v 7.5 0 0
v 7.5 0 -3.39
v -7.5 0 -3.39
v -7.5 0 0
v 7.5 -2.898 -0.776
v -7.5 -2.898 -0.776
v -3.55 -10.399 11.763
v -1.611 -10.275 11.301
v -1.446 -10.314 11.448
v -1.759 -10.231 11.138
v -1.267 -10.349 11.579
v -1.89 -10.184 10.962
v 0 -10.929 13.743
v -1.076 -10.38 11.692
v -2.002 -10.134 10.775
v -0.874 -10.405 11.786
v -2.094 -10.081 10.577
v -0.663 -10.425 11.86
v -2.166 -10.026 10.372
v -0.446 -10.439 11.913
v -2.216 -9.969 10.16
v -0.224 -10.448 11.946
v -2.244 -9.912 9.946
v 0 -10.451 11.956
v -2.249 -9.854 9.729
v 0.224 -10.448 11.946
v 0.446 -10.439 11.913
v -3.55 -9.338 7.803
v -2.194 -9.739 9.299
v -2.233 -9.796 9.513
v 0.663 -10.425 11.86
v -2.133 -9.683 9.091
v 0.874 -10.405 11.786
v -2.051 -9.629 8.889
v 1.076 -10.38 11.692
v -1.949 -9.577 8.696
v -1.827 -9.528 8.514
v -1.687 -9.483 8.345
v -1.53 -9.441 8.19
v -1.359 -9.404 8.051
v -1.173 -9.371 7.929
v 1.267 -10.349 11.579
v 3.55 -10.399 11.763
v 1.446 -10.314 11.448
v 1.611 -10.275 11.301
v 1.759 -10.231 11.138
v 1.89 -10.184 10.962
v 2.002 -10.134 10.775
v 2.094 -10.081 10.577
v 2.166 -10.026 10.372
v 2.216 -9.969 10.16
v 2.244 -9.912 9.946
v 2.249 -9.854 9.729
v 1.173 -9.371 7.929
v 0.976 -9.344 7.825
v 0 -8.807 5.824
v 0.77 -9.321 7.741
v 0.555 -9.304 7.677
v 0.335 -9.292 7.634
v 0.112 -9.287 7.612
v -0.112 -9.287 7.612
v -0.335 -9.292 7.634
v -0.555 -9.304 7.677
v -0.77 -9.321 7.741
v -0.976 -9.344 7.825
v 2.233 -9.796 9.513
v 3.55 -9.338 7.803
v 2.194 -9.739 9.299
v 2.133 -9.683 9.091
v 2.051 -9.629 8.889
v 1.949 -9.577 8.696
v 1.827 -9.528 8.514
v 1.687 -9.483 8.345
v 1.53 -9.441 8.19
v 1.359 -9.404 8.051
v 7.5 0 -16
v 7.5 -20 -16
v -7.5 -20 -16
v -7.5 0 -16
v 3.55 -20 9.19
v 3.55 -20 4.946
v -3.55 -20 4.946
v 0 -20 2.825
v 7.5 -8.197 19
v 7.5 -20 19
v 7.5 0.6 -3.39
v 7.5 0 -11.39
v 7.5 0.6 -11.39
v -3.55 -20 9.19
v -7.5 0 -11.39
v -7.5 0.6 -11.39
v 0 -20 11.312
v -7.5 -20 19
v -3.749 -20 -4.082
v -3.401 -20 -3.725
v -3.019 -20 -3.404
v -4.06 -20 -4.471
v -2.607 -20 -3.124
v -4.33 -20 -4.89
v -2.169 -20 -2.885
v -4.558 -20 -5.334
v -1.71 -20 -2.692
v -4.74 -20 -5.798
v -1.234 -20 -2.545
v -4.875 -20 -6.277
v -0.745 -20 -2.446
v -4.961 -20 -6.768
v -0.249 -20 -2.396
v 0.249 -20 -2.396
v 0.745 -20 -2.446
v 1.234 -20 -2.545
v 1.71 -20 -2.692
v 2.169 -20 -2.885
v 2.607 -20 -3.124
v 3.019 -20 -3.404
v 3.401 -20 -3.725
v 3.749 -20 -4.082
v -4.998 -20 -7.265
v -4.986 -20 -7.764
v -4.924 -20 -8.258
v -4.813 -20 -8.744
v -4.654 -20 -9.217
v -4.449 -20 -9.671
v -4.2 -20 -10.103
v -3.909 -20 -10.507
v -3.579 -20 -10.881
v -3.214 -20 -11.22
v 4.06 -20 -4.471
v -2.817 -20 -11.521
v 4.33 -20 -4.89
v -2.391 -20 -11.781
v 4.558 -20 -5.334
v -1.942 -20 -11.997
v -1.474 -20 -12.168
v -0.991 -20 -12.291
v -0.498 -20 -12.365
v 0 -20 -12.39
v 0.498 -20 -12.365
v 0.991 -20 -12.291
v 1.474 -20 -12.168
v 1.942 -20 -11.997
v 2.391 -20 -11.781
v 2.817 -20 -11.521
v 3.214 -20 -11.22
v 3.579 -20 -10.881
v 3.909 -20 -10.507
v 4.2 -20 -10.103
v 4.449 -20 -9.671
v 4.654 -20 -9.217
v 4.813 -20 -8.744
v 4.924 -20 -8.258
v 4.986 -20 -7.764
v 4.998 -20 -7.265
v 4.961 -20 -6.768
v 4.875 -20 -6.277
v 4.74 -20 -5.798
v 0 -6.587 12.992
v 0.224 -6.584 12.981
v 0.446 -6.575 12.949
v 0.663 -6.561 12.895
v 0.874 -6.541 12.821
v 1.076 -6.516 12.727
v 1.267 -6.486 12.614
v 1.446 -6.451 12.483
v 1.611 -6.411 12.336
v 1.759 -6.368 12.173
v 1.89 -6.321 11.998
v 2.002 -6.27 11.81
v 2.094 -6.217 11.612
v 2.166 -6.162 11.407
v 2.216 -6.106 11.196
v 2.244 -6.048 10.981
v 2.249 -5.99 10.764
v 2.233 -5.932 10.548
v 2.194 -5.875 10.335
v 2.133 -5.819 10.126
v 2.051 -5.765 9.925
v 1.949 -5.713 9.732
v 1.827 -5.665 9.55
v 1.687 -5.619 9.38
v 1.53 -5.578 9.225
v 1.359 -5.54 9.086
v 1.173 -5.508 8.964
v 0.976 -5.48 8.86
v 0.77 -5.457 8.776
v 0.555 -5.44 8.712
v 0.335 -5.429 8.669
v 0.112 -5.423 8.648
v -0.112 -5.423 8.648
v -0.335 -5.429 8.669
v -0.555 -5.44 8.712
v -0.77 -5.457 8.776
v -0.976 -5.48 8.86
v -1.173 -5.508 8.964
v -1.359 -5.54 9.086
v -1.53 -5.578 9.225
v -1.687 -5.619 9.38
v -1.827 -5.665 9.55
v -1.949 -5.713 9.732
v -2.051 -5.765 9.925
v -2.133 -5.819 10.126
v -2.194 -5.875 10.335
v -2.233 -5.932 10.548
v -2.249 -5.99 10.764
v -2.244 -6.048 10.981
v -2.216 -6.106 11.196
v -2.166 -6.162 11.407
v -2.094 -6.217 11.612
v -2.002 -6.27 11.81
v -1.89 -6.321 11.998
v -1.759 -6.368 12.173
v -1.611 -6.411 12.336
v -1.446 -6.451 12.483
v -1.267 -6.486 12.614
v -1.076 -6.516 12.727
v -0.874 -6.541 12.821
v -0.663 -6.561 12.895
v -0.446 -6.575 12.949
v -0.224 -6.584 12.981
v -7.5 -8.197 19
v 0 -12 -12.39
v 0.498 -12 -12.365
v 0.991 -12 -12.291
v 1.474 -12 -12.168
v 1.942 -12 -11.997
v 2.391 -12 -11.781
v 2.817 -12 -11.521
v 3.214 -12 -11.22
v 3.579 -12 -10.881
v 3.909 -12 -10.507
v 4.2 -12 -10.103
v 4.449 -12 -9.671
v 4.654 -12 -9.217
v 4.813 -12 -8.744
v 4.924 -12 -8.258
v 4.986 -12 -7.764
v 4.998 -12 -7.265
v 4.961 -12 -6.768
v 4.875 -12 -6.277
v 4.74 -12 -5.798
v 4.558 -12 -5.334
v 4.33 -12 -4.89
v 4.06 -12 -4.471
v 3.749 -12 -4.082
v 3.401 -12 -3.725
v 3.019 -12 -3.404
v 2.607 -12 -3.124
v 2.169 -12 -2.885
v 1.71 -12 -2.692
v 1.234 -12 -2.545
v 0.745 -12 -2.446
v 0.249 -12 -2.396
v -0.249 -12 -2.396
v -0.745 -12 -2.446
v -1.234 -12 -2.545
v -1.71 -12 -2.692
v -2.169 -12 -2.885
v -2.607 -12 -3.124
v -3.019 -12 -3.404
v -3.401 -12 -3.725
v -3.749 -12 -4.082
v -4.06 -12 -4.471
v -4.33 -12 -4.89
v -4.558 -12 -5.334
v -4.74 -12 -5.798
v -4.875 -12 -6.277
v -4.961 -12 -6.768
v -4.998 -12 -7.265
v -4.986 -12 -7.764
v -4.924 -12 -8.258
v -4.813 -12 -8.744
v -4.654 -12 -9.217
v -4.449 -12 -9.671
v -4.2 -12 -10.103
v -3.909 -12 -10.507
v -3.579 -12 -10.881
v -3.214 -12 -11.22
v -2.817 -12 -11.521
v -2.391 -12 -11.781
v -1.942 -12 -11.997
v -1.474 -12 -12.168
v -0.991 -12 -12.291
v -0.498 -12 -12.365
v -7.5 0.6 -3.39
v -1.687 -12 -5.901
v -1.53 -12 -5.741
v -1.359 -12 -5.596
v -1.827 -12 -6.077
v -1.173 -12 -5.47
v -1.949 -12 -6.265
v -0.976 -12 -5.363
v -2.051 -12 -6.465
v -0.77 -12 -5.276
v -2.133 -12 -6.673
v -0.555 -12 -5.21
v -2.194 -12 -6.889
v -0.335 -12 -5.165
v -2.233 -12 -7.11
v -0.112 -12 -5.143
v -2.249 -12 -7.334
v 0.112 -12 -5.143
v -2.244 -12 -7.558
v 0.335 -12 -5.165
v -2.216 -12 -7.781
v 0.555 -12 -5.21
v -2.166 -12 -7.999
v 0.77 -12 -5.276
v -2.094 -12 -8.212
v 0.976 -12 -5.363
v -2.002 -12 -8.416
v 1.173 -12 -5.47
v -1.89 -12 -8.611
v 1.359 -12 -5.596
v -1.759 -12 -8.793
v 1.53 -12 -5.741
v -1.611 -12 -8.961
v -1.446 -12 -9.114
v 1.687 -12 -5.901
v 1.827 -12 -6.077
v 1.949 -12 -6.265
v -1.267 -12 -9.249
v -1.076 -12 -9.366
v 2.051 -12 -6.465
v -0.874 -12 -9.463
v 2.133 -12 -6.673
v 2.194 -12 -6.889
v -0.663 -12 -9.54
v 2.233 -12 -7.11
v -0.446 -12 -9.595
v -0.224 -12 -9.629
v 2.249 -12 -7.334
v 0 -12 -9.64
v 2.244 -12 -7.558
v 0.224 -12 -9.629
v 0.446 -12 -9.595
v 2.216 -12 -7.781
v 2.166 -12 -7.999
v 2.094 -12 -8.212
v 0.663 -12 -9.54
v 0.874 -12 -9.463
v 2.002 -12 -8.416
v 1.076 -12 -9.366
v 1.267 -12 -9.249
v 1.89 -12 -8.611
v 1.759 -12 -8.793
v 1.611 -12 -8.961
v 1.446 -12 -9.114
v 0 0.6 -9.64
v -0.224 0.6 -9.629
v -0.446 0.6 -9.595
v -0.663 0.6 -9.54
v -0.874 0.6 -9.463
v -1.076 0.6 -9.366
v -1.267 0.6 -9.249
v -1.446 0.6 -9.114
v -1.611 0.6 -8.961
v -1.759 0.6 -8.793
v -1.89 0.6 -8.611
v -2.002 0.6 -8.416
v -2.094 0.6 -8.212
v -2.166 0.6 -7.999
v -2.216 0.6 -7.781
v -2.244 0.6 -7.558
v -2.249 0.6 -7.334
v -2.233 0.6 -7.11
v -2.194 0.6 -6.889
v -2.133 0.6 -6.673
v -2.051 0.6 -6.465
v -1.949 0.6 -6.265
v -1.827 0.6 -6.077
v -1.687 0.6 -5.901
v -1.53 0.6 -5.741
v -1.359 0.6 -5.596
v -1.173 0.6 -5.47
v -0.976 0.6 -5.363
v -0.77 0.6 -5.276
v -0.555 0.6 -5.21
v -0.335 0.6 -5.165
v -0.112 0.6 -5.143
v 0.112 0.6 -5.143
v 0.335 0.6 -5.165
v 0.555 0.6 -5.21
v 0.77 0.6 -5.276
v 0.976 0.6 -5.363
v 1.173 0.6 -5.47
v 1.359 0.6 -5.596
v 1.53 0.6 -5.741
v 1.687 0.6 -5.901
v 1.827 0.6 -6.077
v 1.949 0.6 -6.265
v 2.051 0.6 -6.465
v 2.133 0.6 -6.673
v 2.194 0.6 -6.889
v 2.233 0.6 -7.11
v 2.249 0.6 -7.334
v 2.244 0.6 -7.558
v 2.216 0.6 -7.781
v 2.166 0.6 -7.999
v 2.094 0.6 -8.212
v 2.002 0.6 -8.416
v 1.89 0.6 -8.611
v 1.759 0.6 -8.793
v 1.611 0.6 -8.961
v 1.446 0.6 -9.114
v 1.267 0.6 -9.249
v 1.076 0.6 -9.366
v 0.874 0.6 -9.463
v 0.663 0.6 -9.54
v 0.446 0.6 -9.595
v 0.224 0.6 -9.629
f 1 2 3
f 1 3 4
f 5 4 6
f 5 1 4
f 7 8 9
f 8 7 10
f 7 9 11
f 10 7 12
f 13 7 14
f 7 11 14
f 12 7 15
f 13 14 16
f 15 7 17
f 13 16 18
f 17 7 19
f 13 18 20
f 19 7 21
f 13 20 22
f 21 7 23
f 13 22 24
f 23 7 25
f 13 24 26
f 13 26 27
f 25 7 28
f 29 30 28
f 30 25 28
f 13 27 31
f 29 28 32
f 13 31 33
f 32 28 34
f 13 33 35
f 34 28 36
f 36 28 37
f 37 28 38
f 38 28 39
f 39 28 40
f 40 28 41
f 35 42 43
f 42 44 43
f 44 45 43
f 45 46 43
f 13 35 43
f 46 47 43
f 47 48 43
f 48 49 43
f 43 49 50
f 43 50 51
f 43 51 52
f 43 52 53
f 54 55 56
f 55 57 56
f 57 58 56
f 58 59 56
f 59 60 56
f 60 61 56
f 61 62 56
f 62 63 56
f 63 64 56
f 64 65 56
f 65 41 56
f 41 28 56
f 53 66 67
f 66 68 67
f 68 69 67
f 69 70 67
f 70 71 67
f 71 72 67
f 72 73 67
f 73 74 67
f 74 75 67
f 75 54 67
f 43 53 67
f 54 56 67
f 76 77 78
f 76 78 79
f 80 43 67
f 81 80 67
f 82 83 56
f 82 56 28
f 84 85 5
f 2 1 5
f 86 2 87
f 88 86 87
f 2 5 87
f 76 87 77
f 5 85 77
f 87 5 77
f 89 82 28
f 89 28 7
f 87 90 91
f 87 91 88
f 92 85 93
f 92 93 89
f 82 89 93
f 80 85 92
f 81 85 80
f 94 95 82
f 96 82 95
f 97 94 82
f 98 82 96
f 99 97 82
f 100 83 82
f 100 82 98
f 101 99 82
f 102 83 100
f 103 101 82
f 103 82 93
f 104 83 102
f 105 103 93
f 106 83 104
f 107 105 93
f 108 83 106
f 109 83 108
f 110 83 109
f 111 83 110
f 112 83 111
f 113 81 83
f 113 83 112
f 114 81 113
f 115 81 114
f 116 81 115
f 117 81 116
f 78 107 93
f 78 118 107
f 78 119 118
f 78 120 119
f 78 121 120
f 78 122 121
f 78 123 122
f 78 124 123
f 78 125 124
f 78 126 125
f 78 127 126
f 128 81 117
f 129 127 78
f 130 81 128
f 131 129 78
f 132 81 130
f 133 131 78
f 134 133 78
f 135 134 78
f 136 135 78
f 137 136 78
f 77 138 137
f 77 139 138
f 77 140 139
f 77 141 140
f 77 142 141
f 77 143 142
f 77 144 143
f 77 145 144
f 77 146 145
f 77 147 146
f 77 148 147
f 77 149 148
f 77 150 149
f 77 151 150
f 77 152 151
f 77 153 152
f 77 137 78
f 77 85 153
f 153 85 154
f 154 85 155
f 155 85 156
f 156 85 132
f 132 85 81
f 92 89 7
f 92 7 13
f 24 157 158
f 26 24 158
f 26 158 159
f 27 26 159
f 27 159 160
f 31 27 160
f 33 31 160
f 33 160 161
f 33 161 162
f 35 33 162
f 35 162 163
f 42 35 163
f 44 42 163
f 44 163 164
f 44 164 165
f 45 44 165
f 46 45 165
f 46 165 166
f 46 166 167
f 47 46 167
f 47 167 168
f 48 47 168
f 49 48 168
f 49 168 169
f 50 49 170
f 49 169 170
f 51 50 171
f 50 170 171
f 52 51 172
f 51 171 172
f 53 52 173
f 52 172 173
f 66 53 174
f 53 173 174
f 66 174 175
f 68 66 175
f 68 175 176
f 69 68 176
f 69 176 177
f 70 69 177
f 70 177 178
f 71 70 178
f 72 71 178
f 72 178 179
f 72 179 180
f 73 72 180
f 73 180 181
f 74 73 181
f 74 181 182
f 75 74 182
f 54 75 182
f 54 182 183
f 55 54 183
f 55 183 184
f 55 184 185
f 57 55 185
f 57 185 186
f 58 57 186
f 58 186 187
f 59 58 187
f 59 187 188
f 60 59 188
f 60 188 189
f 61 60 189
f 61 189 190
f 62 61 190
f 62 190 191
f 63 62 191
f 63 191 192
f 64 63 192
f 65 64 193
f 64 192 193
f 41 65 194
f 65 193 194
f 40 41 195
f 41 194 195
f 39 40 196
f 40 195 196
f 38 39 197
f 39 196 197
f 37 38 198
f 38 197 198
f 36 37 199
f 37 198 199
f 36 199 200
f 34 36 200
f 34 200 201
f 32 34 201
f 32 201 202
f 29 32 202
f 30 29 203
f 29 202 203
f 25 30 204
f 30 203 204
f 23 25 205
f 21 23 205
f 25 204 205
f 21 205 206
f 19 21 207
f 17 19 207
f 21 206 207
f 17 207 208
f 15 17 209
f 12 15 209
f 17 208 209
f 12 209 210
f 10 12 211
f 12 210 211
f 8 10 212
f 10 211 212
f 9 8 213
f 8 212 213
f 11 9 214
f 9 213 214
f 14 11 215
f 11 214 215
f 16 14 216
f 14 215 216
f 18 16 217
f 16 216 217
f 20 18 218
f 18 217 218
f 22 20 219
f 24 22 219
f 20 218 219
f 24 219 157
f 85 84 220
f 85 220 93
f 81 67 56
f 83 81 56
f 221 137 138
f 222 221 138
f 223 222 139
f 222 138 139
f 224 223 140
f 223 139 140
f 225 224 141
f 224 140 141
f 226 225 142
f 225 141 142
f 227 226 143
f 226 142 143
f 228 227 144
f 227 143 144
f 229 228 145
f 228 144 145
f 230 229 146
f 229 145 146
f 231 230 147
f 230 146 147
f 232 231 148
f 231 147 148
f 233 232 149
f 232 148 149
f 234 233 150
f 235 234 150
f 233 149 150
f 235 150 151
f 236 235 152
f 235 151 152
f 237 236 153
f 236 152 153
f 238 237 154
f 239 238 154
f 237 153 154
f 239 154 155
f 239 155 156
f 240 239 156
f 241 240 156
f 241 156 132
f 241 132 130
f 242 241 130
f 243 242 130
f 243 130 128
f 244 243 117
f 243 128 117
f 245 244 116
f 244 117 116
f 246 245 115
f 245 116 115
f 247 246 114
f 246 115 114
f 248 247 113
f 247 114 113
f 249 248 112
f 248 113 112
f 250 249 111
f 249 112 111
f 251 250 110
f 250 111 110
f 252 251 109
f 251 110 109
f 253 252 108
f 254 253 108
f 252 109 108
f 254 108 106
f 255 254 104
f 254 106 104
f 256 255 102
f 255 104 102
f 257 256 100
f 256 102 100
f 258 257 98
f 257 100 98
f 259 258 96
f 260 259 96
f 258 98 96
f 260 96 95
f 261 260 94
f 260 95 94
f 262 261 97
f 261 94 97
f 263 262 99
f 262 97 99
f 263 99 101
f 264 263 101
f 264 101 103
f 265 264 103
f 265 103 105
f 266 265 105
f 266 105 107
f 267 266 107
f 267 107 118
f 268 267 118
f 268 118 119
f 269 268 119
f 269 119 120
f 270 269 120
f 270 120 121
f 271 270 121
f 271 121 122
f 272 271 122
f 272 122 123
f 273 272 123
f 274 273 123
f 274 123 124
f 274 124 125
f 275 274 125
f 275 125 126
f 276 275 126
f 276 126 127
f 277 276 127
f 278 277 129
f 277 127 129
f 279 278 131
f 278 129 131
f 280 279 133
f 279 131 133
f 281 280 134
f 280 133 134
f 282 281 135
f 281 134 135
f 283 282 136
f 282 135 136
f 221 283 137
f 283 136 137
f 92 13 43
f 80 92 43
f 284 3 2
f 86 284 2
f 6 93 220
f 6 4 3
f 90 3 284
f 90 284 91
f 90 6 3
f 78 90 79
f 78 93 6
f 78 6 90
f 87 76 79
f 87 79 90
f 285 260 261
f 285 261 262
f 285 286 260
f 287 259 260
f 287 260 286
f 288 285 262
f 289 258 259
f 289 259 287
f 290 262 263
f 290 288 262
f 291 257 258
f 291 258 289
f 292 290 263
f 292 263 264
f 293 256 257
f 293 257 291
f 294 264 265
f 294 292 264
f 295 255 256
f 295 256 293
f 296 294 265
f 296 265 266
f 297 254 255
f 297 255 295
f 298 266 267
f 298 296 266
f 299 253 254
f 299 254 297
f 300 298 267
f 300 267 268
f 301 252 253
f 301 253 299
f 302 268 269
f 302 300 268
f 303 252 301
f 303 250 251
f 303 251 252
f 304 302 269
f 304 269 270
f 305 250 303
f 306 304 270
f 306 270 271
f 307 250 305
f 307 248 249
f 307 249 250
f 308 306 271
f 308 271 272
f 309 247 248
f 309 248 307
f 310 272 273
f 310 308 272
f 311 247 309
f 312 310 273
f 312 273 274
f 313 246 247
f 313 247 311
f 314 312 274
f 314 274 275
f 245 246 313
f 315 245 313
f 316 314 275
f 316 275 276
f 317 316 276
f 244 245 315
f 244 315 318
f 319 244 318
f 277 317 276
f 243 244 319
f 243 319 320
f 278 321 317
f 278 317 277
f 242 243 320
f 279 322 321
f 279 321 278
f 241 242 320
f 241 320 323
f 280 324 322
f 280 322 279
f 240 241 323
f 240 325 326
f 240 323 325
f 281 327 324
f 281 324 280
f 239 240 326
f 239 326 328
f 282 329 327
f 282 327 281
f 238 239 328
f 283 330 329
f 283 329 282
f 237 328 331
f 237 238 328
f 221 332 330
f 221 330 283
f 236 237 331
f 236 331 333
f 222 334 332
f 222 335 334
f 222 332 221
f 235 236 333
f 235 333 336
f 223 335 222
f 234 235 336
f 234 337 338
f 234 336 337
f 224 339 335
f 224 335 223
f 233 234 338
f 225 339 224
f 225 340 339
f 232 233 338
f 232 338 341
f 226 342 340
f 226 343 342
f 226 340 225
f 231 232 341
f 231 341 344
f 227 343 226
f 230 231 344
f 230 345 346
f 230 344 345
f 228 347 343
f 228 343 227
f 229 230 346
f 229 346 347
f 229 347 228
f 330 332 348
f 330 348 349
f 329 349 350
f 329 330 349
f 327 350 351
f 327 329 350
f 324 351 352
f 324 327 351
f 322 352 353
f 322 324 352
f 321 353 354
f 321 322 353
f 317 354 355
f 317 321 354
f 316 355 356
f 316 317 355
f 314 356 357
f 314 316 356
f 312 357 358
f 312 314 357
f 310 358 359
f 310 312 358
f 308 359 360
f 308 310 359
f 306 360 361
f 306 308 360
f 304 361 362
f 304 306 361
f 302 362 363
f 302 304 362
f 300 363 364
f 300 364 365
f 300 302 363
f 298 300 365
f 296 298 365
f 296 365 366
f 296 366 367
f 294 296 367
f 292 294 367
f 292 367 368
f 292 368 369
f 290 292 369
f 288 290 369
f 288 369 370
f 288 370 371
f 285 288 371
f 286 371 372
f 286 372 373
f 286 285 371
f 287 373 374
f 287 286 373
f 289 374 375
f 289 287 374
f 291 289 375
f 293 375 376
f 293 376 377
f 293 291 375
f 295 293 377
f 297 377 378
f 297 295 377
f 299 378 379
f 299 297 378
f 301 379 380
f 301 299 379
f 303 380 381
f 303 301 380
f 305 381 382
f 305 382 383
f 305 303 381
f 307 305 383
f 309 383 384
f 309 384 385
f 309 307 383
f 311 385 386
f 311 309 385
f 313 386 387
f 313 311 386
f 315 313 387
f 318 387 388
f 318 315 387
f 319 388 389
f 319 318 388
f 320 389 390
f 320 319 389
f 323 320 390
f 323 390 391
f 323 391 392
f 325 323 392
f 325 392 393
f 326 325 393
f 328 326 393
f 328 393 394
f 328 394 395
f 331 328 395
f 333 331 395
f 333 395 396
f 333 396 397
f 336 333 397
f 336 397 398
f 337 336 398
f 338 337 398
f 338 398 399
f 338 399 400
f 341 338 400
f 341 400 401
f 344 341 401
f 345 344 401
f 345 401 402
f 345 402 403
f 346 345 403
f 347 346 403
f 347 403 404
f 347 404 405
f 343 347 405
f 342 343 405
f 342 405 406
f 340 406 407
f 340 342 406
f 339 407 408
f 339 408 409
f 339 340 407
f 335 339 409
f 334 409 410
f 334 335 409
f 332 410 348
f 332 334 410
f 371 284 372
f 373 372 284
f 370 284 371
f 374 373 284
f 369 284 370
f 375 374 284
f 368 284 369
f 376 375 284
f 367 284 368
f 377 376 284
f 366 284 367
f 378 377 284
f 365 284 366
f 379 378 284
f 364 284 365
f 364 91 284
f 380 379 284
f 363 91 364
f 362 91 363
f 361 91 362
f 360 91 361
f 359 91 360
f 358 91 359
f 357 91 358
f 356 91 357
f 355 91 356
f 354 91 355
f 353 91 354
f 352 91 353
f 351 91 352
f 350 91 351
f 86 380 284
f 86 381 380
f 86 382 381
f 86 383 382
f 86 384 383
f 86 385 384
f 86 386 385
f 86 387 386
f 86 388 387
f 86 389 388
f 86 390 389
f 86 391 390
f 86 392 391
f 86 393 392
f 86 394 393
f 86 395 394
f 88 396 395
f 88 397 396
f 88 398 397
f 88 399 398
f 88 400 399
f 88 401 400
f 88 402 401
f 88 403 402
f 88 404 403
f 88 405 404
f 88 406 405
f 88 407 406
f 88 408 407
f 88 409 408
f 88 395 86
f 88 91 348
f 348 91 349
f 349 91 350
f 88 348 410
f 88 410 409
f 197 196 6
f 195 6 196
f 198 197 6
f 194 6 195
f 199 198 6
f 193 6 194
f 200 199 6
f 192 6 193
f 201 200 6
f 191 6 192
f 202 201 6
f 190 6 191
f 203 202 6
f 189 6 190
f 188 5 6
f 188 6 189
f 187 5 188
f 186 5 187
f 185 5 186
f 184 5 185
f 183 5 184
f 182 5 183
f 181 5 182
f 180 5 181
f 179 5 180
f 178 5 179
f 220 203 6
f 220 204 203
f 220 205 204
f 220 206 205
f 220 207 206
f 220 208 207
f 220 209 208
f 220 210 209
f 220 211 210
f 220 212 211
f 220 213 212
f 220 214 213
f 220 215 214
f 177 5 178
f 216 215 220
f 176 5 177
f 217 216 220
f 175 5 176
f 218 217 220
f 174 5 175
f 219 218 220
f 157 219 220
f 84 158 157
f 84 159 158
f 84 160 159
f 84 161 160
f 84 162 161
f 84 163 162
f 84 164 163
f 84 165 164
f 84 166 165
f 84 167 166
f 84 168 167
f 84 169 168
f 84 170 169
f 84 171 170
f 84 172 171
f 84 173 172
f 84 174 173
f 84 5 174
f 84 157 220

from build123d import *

# Parameters (mm, degrees)
BOSS_EXTRUDE1_DEPTH = 7.5
SKETCH2_R           = 2.25
CUT_EXTRUDE1_DEPTH  = 28.200078529
SKETCH3_R           = 2.25
CUT_EXTRUDE2_DEPTH  = 29.587584718
CUT_EXTRUDE3_START  = -4
CUT_EXTRUDE3_DEPTH  = 24.200078529
SKETCH5_W           = 15
SKETCH5_H           = 8
SKETCH5_R           = 2.25
BOSS_EXTRUDE2_DEPTH = 0.6
SKETCH6_R           = 5
CUT_EXTRUDE4_DEPTH  = 8


with BuildPart() as part:
    # Sketch1 → Boss-Extrude1 (new, symmetric)
    with BuildSketch(Plane(origin=(0, 0, 0), x_dir=(0, 0, -1), z_dir=(1, 0, 0))):
        Polygon((0.776457135, -2.897777479), (-19, -8.196863197), (-19, -20), (16, -20), (16, 0), (0, 0), align=None)
    extrude(amount=BOSS_EXTRUDE1_DEPTH, both=True)

    # Sketch2 → Cut-Extrude1 (cut, through all)
    with BuildSketch(Plane(origin=(0, -2.897777479, -0.776457135), x_dir=(1, 0, 0), z_dir=(0, 0.9659258262890682, 0.2588190451025216))):
        with Locations(Location((0, -12.003847577, 0), (0, 0, 270))):
            Circle(SKETCH2_R)
    extrude(amount=-CUT_EXTRUDE1_DEPTH, mode=Mode.SUBTRACT)

    # Sketch3 → Cut-Extrude2 (cut, through all)
    with BuildSketch(Plane.XZ.offset(20)):
        with Locations(Location((0, -7.39, 0), (0, 0, 270))):
            Circle(SKETCH3_R)
    extrude(amount=-CUT_EXTRUDE2_DEPTH, mode=Mode.SUBTRACT)

    # Sketch4 → Cut-Extrude3 (cut, through all)
    with BuildSketch(Plane(origin=(0, -2.897777479, -0.776457135), x_dir=(1, 0, 0), z_dir=(0, 0.9659258262890681, 0.2588190451025216)).offset(CUT_EXTRUDE3_START)):
        Polygon((0, -16.103034489), (3.55, -14.053441033), (3.55, -9.954254122), (0, -7.904660666), (-3.55, -9.954254122), (-3.55, -14.053441033), align=None)
    extrude(amount=-CUT_EXTRUDE3_DEPTH, mode=Mode.SUBTRACT)

    # Sketch5 → Boss-Extrude2 (add)
    with BuildSketch(Plane(origin=(0, 0, 0), x_dir=(1, 0, 0), z_dir=(0, 1, 0))):
        with Locations((0, 7.39)):
            Rectangle(SKETCH5_W, SKETCH5_H)
        with Locations(Location((0, 7.39, 0), (0, 0, 90))):
            Circle(SKETCH5_R, mode=Mode.SUBTRACT)
    extrude(amount=BOSS_EXTRUDE2_DEPTH)

    # Sketch6 → Cut-Extrude4 (cut)
    with BuildSketch(Plane.XZ.offset(20)):
        with Locations(Location((0, -7.39, 0), (0, 0, 270))):
            Circle(SKETCH6_R)
    extrude(amount=-CUT_EXTRUDE4_DEPTH, mode=Mode.SUBTRACT)


solid = part.part
